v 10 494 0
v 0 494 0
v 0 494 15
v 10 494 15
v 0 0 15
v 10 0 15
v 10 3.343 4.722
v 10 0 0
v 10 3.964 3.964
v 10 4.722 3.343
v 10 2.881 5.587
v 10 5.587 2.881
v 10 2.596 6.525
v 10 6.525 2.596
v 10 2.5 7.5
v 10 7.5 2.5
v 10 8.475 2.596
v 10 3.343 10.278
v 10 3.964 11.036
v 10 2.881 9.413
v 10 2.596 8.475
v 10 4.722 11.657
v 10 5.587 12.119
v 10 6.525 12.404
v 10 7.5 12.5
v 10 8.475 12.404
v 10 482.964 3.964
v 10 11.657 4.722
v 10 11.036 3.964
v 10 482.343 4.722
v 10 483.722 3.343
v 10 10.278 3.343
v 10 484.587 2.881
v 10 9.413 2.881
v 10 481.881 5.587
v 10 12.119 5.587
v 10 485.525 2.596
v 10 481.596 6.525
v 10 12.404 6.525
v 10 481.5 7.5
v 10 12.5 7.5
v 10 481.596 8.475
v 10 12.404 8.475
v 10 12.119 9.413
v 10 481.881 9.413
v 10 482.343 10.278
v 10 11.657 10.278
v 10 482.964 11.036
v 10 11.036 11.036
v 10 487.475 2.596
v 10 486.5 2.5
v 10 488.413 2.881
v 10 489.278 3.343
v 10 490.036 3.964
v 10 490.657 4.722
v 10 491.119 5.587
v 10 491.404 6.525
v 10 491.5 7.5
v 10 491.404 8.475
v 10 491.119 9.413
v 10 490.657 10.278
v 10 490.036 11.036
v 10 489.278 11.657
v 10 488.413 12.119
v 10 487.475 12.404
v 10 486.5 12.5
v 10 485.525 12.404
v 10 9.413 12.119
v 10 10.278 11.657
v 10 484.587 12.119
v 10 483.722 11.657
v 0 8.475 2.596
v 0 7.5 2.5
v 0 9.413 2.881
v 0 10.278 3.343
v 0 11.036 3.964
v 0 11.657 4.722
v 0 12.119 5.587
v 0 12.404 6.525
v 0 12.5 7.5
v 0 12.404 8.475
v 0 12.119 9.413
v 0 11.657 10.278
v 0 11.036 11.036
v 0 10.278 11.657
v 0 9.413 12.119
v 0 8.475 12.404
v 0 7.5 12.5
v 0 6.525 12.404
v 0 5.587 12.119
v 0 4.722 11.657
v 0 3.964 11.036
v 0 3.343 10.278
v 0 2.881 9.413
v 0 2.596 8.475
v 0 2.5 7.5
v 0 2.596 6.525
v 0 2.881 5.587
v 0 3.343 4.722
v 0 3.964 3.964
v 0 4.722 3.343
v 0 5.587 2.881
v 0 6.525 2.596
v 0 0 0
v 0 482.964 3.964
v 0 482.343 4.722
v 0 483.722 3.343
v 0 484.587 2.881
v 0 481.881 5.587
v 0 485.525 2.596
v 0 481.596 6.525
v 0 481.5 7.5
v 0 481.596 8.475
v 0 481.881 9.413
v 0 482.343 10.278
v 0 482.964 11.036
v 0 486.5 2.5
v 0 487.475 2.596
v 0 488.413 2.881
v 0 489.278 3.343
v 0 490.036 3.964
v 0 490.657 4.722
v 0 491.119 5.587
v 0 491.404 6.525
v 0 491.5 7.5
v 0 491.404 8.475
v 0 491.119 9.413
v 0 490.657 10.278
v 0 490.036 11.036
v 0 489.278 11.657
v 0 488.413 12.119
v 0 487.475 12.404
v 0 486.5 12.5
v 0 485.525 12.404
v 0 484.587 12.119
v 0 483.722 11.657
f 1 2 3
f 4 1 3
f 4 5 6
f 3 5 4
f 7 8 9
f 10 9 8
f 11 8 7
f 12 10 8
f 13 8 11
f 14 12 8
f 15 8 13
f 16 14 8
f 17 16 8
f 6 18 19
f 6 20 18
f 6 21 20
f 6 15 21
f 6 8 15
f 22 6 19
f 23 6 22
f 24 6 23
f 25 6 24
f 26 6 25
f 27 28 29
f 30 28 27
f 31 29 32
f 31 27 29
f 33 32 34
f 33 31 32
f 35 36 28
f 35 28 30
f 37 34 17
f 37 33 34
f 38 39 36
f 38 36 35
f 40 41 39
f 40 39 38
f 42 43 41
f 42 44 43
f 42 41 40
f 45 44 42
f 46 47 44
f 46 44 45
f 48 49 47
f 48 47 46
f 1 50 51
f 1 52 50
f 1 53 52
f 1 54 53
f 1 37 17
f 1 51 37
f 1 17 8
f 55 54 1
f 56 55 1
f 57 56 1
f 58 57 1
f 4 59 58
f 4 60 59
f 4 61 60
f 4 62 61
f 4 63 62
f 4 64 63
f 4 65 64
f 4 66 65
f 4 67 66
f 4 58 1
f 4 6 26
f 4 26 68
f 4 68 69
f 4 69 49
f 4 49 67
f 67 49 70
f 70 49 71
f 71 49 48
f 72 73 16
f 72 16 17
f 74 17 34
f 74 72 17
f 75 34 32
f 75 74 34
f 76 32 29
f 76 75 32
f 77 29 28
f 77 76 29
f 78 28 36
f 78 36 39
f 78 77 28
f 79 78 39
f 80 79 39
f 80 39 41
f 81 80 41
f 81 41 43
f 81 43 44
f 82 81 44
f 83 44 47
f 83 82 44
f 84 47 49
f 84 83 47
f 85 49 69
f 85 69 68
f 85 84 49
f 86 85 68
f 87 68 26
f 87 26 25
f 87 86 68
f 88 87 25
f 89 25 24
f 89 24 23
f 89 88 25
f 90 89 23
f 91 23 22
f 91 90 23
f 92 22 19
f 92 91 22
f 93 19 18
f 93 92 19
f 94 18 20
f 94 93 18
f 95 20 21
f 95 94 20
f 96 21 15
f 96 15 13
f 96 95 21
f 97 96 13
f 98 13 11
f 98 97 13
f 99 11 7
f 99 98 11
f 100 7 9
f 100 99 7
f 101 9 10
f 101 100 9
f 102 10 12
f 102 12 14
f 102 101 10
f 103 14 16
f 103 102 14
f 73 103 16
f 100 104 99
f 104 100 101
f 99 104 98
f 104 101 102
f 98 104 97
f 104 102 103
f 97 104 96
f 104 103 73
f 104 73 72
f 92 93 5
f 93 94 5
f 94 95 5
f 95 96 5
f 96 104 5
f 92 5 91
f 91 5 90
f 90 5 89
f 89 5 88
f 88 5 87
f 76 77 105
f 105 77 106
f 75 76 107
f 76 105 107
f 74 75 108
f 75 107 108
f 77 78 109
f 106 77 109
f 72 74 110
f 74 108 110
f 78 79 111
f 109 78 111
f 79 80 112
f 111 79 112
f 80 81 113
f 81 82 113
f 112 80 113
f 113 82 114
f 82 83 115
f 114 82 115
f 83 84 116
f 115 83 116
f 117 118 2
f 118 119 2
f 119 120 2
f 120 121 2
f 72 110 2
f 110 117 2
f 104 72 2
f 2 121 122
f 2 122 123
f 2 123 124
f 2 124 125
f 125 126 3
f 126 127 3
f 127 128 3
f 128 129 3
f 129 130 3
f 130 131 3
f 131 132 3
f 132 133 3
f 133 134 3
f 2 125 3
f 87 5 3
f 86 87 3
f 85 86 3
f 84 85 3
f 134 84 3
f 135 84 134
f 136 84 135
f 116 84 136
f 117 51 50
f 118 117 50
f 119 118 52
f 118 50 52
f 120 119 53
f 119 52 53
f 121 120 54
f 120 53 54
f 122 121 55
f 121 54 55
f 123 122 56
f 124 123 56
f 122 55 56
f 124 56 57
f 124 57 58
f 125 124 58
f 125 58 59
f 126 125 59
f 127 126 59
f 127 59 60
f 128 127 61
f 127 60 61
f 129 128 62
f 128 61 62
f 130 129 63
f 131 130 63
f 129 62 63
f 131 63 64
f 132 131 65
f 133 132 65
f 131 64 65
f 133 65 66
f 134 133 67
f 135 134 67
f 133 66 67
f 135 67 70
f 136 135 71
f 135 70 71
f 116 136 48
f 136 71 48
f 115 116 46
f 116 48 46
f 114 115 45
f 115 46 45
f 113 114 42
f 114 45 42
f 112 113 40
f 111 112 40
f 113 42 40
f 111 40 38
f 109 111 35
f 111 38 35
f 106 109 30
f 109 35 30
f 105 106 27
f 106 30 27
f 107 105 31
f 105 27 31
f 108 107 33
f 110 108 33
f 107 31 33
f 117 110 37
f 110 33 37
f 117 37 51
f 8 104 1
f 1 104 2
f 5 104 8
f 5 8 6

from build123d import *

# Parameters (mm, degrees)
SKETCH1_W           = 494
SKETCH1_H           = 15
BOSS_EXTRUDE1_DEPTH = 10
SKETCH3_R           = 5
CUT_EXTRUDE1_DEPTH  = 10
SKETCH4_R           = 5
CUT_EXTRUDE2_DEPTH  = 10


with BuildPart() as part:
    # Sketch1 → Boss-Extrude1 (new body)
    with BuildSketch(Plane.YZ):
        with Locations((247, 7.5)):
            Rectangle(SKETCH1_W, SKETCH1_H)
    extrude(amount=BOSS_EXTRUDE1_DEPTH)

    # Sketch3 → Cut-Extrude1 (cut)
    with BuildSketch(Plane.YZ):
        with Locations(Location((7.5, 7.5, 0), (0, 0, 270))):
            Circle(SKETCH3_R)
    extrude(amount=CUT_EXTRUDE1_DEPTH, mode=Mode.SUBTRACT)

    # Sketch4 → Cut-Extrude2 (cut)
    with BuildSketch(Plane.YZ.offset(10)):
        with Locations(Location((486.5, 7.5, 0), (0, 0, 270))):
            Circle(SKETCH4_R)
    extrude(amount=-CUT_EXTRUDE2_DEPTH, mode=Mode.SUBTRACT)


solid = part.part
